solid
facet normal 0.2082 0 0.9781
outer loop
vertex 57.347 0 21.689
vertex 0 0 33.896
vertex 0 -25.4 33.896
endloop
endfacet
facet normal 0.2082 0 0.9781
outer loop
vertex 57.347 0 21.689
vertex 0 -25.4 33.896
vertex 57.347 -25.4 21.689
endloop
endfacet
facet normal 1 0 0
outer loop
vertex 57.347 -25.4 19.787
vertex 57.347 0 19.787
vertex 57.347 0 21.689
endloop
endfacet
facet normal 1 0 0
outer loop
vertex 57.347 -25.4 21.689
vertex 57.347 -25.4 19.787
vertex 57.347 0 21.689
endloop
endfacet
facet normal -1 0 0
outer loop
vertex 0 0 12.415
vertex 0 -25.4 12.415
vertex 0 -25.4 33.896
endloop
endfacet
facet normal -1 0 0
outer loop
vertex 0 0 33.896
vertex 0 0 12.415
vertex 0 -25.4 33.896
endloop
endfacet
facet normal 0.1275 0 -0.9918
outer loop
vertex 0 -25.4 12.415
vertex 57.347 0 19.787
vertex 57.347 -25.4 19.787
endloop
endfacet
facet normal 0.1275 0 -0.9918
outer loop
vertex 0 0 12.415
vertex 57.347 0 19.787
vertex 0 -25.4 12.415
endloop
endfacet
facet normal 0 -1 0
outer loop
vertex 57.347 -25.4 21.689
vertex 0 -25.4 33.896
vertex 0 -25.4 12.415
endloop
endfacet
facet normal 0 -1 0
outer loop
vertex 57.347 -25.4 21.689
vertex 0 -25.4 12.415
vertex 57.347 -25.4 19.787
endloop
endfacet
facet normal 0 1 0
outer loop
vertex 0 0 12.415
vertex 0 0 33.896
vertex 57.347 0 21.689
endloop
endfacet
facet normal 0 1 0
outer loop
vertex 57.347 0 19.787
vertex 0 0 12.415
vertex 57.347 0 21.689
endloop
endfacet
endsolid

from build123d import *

# Parameters (mm, degrees)
F0_W     = 57.347074
F0_H     = 21.480516
F1_DEPTH = 25.4
F3_DEPTH = 25.4
F5_DEPTH = 25.4


with BuildPart() as f1:
    # F0 (on Front) → F1 (new body)
    with BuildSketch(Plane.XZ):
        with Locations((28.673537, 23.155603)):
            Rectangle(F0_W, F0_H)
    extrude(amount=F1_DEPTH)

    # F2 (on Front) → F3 (cut)
    with BuildSketch(Plane.XZ):
        Polygon((57.347074, 33.895861), (0, 33.895861), (57.347074, 21.689083), align=None)
    extrude(amount=F3_DEPTH, mode=Mode.SUBTRACT)

    # F4 (on Front) → F5 (cut)
    with BuildSketch(Plane.XZ):
        Polygon((57.347074, 19.787414), (0, 12.415345), (57.347074, 12.415345), align=None)
    extrude(amount=F5_DEPTH, mode=Mode.SUBTRACT)


solid = f1.part
